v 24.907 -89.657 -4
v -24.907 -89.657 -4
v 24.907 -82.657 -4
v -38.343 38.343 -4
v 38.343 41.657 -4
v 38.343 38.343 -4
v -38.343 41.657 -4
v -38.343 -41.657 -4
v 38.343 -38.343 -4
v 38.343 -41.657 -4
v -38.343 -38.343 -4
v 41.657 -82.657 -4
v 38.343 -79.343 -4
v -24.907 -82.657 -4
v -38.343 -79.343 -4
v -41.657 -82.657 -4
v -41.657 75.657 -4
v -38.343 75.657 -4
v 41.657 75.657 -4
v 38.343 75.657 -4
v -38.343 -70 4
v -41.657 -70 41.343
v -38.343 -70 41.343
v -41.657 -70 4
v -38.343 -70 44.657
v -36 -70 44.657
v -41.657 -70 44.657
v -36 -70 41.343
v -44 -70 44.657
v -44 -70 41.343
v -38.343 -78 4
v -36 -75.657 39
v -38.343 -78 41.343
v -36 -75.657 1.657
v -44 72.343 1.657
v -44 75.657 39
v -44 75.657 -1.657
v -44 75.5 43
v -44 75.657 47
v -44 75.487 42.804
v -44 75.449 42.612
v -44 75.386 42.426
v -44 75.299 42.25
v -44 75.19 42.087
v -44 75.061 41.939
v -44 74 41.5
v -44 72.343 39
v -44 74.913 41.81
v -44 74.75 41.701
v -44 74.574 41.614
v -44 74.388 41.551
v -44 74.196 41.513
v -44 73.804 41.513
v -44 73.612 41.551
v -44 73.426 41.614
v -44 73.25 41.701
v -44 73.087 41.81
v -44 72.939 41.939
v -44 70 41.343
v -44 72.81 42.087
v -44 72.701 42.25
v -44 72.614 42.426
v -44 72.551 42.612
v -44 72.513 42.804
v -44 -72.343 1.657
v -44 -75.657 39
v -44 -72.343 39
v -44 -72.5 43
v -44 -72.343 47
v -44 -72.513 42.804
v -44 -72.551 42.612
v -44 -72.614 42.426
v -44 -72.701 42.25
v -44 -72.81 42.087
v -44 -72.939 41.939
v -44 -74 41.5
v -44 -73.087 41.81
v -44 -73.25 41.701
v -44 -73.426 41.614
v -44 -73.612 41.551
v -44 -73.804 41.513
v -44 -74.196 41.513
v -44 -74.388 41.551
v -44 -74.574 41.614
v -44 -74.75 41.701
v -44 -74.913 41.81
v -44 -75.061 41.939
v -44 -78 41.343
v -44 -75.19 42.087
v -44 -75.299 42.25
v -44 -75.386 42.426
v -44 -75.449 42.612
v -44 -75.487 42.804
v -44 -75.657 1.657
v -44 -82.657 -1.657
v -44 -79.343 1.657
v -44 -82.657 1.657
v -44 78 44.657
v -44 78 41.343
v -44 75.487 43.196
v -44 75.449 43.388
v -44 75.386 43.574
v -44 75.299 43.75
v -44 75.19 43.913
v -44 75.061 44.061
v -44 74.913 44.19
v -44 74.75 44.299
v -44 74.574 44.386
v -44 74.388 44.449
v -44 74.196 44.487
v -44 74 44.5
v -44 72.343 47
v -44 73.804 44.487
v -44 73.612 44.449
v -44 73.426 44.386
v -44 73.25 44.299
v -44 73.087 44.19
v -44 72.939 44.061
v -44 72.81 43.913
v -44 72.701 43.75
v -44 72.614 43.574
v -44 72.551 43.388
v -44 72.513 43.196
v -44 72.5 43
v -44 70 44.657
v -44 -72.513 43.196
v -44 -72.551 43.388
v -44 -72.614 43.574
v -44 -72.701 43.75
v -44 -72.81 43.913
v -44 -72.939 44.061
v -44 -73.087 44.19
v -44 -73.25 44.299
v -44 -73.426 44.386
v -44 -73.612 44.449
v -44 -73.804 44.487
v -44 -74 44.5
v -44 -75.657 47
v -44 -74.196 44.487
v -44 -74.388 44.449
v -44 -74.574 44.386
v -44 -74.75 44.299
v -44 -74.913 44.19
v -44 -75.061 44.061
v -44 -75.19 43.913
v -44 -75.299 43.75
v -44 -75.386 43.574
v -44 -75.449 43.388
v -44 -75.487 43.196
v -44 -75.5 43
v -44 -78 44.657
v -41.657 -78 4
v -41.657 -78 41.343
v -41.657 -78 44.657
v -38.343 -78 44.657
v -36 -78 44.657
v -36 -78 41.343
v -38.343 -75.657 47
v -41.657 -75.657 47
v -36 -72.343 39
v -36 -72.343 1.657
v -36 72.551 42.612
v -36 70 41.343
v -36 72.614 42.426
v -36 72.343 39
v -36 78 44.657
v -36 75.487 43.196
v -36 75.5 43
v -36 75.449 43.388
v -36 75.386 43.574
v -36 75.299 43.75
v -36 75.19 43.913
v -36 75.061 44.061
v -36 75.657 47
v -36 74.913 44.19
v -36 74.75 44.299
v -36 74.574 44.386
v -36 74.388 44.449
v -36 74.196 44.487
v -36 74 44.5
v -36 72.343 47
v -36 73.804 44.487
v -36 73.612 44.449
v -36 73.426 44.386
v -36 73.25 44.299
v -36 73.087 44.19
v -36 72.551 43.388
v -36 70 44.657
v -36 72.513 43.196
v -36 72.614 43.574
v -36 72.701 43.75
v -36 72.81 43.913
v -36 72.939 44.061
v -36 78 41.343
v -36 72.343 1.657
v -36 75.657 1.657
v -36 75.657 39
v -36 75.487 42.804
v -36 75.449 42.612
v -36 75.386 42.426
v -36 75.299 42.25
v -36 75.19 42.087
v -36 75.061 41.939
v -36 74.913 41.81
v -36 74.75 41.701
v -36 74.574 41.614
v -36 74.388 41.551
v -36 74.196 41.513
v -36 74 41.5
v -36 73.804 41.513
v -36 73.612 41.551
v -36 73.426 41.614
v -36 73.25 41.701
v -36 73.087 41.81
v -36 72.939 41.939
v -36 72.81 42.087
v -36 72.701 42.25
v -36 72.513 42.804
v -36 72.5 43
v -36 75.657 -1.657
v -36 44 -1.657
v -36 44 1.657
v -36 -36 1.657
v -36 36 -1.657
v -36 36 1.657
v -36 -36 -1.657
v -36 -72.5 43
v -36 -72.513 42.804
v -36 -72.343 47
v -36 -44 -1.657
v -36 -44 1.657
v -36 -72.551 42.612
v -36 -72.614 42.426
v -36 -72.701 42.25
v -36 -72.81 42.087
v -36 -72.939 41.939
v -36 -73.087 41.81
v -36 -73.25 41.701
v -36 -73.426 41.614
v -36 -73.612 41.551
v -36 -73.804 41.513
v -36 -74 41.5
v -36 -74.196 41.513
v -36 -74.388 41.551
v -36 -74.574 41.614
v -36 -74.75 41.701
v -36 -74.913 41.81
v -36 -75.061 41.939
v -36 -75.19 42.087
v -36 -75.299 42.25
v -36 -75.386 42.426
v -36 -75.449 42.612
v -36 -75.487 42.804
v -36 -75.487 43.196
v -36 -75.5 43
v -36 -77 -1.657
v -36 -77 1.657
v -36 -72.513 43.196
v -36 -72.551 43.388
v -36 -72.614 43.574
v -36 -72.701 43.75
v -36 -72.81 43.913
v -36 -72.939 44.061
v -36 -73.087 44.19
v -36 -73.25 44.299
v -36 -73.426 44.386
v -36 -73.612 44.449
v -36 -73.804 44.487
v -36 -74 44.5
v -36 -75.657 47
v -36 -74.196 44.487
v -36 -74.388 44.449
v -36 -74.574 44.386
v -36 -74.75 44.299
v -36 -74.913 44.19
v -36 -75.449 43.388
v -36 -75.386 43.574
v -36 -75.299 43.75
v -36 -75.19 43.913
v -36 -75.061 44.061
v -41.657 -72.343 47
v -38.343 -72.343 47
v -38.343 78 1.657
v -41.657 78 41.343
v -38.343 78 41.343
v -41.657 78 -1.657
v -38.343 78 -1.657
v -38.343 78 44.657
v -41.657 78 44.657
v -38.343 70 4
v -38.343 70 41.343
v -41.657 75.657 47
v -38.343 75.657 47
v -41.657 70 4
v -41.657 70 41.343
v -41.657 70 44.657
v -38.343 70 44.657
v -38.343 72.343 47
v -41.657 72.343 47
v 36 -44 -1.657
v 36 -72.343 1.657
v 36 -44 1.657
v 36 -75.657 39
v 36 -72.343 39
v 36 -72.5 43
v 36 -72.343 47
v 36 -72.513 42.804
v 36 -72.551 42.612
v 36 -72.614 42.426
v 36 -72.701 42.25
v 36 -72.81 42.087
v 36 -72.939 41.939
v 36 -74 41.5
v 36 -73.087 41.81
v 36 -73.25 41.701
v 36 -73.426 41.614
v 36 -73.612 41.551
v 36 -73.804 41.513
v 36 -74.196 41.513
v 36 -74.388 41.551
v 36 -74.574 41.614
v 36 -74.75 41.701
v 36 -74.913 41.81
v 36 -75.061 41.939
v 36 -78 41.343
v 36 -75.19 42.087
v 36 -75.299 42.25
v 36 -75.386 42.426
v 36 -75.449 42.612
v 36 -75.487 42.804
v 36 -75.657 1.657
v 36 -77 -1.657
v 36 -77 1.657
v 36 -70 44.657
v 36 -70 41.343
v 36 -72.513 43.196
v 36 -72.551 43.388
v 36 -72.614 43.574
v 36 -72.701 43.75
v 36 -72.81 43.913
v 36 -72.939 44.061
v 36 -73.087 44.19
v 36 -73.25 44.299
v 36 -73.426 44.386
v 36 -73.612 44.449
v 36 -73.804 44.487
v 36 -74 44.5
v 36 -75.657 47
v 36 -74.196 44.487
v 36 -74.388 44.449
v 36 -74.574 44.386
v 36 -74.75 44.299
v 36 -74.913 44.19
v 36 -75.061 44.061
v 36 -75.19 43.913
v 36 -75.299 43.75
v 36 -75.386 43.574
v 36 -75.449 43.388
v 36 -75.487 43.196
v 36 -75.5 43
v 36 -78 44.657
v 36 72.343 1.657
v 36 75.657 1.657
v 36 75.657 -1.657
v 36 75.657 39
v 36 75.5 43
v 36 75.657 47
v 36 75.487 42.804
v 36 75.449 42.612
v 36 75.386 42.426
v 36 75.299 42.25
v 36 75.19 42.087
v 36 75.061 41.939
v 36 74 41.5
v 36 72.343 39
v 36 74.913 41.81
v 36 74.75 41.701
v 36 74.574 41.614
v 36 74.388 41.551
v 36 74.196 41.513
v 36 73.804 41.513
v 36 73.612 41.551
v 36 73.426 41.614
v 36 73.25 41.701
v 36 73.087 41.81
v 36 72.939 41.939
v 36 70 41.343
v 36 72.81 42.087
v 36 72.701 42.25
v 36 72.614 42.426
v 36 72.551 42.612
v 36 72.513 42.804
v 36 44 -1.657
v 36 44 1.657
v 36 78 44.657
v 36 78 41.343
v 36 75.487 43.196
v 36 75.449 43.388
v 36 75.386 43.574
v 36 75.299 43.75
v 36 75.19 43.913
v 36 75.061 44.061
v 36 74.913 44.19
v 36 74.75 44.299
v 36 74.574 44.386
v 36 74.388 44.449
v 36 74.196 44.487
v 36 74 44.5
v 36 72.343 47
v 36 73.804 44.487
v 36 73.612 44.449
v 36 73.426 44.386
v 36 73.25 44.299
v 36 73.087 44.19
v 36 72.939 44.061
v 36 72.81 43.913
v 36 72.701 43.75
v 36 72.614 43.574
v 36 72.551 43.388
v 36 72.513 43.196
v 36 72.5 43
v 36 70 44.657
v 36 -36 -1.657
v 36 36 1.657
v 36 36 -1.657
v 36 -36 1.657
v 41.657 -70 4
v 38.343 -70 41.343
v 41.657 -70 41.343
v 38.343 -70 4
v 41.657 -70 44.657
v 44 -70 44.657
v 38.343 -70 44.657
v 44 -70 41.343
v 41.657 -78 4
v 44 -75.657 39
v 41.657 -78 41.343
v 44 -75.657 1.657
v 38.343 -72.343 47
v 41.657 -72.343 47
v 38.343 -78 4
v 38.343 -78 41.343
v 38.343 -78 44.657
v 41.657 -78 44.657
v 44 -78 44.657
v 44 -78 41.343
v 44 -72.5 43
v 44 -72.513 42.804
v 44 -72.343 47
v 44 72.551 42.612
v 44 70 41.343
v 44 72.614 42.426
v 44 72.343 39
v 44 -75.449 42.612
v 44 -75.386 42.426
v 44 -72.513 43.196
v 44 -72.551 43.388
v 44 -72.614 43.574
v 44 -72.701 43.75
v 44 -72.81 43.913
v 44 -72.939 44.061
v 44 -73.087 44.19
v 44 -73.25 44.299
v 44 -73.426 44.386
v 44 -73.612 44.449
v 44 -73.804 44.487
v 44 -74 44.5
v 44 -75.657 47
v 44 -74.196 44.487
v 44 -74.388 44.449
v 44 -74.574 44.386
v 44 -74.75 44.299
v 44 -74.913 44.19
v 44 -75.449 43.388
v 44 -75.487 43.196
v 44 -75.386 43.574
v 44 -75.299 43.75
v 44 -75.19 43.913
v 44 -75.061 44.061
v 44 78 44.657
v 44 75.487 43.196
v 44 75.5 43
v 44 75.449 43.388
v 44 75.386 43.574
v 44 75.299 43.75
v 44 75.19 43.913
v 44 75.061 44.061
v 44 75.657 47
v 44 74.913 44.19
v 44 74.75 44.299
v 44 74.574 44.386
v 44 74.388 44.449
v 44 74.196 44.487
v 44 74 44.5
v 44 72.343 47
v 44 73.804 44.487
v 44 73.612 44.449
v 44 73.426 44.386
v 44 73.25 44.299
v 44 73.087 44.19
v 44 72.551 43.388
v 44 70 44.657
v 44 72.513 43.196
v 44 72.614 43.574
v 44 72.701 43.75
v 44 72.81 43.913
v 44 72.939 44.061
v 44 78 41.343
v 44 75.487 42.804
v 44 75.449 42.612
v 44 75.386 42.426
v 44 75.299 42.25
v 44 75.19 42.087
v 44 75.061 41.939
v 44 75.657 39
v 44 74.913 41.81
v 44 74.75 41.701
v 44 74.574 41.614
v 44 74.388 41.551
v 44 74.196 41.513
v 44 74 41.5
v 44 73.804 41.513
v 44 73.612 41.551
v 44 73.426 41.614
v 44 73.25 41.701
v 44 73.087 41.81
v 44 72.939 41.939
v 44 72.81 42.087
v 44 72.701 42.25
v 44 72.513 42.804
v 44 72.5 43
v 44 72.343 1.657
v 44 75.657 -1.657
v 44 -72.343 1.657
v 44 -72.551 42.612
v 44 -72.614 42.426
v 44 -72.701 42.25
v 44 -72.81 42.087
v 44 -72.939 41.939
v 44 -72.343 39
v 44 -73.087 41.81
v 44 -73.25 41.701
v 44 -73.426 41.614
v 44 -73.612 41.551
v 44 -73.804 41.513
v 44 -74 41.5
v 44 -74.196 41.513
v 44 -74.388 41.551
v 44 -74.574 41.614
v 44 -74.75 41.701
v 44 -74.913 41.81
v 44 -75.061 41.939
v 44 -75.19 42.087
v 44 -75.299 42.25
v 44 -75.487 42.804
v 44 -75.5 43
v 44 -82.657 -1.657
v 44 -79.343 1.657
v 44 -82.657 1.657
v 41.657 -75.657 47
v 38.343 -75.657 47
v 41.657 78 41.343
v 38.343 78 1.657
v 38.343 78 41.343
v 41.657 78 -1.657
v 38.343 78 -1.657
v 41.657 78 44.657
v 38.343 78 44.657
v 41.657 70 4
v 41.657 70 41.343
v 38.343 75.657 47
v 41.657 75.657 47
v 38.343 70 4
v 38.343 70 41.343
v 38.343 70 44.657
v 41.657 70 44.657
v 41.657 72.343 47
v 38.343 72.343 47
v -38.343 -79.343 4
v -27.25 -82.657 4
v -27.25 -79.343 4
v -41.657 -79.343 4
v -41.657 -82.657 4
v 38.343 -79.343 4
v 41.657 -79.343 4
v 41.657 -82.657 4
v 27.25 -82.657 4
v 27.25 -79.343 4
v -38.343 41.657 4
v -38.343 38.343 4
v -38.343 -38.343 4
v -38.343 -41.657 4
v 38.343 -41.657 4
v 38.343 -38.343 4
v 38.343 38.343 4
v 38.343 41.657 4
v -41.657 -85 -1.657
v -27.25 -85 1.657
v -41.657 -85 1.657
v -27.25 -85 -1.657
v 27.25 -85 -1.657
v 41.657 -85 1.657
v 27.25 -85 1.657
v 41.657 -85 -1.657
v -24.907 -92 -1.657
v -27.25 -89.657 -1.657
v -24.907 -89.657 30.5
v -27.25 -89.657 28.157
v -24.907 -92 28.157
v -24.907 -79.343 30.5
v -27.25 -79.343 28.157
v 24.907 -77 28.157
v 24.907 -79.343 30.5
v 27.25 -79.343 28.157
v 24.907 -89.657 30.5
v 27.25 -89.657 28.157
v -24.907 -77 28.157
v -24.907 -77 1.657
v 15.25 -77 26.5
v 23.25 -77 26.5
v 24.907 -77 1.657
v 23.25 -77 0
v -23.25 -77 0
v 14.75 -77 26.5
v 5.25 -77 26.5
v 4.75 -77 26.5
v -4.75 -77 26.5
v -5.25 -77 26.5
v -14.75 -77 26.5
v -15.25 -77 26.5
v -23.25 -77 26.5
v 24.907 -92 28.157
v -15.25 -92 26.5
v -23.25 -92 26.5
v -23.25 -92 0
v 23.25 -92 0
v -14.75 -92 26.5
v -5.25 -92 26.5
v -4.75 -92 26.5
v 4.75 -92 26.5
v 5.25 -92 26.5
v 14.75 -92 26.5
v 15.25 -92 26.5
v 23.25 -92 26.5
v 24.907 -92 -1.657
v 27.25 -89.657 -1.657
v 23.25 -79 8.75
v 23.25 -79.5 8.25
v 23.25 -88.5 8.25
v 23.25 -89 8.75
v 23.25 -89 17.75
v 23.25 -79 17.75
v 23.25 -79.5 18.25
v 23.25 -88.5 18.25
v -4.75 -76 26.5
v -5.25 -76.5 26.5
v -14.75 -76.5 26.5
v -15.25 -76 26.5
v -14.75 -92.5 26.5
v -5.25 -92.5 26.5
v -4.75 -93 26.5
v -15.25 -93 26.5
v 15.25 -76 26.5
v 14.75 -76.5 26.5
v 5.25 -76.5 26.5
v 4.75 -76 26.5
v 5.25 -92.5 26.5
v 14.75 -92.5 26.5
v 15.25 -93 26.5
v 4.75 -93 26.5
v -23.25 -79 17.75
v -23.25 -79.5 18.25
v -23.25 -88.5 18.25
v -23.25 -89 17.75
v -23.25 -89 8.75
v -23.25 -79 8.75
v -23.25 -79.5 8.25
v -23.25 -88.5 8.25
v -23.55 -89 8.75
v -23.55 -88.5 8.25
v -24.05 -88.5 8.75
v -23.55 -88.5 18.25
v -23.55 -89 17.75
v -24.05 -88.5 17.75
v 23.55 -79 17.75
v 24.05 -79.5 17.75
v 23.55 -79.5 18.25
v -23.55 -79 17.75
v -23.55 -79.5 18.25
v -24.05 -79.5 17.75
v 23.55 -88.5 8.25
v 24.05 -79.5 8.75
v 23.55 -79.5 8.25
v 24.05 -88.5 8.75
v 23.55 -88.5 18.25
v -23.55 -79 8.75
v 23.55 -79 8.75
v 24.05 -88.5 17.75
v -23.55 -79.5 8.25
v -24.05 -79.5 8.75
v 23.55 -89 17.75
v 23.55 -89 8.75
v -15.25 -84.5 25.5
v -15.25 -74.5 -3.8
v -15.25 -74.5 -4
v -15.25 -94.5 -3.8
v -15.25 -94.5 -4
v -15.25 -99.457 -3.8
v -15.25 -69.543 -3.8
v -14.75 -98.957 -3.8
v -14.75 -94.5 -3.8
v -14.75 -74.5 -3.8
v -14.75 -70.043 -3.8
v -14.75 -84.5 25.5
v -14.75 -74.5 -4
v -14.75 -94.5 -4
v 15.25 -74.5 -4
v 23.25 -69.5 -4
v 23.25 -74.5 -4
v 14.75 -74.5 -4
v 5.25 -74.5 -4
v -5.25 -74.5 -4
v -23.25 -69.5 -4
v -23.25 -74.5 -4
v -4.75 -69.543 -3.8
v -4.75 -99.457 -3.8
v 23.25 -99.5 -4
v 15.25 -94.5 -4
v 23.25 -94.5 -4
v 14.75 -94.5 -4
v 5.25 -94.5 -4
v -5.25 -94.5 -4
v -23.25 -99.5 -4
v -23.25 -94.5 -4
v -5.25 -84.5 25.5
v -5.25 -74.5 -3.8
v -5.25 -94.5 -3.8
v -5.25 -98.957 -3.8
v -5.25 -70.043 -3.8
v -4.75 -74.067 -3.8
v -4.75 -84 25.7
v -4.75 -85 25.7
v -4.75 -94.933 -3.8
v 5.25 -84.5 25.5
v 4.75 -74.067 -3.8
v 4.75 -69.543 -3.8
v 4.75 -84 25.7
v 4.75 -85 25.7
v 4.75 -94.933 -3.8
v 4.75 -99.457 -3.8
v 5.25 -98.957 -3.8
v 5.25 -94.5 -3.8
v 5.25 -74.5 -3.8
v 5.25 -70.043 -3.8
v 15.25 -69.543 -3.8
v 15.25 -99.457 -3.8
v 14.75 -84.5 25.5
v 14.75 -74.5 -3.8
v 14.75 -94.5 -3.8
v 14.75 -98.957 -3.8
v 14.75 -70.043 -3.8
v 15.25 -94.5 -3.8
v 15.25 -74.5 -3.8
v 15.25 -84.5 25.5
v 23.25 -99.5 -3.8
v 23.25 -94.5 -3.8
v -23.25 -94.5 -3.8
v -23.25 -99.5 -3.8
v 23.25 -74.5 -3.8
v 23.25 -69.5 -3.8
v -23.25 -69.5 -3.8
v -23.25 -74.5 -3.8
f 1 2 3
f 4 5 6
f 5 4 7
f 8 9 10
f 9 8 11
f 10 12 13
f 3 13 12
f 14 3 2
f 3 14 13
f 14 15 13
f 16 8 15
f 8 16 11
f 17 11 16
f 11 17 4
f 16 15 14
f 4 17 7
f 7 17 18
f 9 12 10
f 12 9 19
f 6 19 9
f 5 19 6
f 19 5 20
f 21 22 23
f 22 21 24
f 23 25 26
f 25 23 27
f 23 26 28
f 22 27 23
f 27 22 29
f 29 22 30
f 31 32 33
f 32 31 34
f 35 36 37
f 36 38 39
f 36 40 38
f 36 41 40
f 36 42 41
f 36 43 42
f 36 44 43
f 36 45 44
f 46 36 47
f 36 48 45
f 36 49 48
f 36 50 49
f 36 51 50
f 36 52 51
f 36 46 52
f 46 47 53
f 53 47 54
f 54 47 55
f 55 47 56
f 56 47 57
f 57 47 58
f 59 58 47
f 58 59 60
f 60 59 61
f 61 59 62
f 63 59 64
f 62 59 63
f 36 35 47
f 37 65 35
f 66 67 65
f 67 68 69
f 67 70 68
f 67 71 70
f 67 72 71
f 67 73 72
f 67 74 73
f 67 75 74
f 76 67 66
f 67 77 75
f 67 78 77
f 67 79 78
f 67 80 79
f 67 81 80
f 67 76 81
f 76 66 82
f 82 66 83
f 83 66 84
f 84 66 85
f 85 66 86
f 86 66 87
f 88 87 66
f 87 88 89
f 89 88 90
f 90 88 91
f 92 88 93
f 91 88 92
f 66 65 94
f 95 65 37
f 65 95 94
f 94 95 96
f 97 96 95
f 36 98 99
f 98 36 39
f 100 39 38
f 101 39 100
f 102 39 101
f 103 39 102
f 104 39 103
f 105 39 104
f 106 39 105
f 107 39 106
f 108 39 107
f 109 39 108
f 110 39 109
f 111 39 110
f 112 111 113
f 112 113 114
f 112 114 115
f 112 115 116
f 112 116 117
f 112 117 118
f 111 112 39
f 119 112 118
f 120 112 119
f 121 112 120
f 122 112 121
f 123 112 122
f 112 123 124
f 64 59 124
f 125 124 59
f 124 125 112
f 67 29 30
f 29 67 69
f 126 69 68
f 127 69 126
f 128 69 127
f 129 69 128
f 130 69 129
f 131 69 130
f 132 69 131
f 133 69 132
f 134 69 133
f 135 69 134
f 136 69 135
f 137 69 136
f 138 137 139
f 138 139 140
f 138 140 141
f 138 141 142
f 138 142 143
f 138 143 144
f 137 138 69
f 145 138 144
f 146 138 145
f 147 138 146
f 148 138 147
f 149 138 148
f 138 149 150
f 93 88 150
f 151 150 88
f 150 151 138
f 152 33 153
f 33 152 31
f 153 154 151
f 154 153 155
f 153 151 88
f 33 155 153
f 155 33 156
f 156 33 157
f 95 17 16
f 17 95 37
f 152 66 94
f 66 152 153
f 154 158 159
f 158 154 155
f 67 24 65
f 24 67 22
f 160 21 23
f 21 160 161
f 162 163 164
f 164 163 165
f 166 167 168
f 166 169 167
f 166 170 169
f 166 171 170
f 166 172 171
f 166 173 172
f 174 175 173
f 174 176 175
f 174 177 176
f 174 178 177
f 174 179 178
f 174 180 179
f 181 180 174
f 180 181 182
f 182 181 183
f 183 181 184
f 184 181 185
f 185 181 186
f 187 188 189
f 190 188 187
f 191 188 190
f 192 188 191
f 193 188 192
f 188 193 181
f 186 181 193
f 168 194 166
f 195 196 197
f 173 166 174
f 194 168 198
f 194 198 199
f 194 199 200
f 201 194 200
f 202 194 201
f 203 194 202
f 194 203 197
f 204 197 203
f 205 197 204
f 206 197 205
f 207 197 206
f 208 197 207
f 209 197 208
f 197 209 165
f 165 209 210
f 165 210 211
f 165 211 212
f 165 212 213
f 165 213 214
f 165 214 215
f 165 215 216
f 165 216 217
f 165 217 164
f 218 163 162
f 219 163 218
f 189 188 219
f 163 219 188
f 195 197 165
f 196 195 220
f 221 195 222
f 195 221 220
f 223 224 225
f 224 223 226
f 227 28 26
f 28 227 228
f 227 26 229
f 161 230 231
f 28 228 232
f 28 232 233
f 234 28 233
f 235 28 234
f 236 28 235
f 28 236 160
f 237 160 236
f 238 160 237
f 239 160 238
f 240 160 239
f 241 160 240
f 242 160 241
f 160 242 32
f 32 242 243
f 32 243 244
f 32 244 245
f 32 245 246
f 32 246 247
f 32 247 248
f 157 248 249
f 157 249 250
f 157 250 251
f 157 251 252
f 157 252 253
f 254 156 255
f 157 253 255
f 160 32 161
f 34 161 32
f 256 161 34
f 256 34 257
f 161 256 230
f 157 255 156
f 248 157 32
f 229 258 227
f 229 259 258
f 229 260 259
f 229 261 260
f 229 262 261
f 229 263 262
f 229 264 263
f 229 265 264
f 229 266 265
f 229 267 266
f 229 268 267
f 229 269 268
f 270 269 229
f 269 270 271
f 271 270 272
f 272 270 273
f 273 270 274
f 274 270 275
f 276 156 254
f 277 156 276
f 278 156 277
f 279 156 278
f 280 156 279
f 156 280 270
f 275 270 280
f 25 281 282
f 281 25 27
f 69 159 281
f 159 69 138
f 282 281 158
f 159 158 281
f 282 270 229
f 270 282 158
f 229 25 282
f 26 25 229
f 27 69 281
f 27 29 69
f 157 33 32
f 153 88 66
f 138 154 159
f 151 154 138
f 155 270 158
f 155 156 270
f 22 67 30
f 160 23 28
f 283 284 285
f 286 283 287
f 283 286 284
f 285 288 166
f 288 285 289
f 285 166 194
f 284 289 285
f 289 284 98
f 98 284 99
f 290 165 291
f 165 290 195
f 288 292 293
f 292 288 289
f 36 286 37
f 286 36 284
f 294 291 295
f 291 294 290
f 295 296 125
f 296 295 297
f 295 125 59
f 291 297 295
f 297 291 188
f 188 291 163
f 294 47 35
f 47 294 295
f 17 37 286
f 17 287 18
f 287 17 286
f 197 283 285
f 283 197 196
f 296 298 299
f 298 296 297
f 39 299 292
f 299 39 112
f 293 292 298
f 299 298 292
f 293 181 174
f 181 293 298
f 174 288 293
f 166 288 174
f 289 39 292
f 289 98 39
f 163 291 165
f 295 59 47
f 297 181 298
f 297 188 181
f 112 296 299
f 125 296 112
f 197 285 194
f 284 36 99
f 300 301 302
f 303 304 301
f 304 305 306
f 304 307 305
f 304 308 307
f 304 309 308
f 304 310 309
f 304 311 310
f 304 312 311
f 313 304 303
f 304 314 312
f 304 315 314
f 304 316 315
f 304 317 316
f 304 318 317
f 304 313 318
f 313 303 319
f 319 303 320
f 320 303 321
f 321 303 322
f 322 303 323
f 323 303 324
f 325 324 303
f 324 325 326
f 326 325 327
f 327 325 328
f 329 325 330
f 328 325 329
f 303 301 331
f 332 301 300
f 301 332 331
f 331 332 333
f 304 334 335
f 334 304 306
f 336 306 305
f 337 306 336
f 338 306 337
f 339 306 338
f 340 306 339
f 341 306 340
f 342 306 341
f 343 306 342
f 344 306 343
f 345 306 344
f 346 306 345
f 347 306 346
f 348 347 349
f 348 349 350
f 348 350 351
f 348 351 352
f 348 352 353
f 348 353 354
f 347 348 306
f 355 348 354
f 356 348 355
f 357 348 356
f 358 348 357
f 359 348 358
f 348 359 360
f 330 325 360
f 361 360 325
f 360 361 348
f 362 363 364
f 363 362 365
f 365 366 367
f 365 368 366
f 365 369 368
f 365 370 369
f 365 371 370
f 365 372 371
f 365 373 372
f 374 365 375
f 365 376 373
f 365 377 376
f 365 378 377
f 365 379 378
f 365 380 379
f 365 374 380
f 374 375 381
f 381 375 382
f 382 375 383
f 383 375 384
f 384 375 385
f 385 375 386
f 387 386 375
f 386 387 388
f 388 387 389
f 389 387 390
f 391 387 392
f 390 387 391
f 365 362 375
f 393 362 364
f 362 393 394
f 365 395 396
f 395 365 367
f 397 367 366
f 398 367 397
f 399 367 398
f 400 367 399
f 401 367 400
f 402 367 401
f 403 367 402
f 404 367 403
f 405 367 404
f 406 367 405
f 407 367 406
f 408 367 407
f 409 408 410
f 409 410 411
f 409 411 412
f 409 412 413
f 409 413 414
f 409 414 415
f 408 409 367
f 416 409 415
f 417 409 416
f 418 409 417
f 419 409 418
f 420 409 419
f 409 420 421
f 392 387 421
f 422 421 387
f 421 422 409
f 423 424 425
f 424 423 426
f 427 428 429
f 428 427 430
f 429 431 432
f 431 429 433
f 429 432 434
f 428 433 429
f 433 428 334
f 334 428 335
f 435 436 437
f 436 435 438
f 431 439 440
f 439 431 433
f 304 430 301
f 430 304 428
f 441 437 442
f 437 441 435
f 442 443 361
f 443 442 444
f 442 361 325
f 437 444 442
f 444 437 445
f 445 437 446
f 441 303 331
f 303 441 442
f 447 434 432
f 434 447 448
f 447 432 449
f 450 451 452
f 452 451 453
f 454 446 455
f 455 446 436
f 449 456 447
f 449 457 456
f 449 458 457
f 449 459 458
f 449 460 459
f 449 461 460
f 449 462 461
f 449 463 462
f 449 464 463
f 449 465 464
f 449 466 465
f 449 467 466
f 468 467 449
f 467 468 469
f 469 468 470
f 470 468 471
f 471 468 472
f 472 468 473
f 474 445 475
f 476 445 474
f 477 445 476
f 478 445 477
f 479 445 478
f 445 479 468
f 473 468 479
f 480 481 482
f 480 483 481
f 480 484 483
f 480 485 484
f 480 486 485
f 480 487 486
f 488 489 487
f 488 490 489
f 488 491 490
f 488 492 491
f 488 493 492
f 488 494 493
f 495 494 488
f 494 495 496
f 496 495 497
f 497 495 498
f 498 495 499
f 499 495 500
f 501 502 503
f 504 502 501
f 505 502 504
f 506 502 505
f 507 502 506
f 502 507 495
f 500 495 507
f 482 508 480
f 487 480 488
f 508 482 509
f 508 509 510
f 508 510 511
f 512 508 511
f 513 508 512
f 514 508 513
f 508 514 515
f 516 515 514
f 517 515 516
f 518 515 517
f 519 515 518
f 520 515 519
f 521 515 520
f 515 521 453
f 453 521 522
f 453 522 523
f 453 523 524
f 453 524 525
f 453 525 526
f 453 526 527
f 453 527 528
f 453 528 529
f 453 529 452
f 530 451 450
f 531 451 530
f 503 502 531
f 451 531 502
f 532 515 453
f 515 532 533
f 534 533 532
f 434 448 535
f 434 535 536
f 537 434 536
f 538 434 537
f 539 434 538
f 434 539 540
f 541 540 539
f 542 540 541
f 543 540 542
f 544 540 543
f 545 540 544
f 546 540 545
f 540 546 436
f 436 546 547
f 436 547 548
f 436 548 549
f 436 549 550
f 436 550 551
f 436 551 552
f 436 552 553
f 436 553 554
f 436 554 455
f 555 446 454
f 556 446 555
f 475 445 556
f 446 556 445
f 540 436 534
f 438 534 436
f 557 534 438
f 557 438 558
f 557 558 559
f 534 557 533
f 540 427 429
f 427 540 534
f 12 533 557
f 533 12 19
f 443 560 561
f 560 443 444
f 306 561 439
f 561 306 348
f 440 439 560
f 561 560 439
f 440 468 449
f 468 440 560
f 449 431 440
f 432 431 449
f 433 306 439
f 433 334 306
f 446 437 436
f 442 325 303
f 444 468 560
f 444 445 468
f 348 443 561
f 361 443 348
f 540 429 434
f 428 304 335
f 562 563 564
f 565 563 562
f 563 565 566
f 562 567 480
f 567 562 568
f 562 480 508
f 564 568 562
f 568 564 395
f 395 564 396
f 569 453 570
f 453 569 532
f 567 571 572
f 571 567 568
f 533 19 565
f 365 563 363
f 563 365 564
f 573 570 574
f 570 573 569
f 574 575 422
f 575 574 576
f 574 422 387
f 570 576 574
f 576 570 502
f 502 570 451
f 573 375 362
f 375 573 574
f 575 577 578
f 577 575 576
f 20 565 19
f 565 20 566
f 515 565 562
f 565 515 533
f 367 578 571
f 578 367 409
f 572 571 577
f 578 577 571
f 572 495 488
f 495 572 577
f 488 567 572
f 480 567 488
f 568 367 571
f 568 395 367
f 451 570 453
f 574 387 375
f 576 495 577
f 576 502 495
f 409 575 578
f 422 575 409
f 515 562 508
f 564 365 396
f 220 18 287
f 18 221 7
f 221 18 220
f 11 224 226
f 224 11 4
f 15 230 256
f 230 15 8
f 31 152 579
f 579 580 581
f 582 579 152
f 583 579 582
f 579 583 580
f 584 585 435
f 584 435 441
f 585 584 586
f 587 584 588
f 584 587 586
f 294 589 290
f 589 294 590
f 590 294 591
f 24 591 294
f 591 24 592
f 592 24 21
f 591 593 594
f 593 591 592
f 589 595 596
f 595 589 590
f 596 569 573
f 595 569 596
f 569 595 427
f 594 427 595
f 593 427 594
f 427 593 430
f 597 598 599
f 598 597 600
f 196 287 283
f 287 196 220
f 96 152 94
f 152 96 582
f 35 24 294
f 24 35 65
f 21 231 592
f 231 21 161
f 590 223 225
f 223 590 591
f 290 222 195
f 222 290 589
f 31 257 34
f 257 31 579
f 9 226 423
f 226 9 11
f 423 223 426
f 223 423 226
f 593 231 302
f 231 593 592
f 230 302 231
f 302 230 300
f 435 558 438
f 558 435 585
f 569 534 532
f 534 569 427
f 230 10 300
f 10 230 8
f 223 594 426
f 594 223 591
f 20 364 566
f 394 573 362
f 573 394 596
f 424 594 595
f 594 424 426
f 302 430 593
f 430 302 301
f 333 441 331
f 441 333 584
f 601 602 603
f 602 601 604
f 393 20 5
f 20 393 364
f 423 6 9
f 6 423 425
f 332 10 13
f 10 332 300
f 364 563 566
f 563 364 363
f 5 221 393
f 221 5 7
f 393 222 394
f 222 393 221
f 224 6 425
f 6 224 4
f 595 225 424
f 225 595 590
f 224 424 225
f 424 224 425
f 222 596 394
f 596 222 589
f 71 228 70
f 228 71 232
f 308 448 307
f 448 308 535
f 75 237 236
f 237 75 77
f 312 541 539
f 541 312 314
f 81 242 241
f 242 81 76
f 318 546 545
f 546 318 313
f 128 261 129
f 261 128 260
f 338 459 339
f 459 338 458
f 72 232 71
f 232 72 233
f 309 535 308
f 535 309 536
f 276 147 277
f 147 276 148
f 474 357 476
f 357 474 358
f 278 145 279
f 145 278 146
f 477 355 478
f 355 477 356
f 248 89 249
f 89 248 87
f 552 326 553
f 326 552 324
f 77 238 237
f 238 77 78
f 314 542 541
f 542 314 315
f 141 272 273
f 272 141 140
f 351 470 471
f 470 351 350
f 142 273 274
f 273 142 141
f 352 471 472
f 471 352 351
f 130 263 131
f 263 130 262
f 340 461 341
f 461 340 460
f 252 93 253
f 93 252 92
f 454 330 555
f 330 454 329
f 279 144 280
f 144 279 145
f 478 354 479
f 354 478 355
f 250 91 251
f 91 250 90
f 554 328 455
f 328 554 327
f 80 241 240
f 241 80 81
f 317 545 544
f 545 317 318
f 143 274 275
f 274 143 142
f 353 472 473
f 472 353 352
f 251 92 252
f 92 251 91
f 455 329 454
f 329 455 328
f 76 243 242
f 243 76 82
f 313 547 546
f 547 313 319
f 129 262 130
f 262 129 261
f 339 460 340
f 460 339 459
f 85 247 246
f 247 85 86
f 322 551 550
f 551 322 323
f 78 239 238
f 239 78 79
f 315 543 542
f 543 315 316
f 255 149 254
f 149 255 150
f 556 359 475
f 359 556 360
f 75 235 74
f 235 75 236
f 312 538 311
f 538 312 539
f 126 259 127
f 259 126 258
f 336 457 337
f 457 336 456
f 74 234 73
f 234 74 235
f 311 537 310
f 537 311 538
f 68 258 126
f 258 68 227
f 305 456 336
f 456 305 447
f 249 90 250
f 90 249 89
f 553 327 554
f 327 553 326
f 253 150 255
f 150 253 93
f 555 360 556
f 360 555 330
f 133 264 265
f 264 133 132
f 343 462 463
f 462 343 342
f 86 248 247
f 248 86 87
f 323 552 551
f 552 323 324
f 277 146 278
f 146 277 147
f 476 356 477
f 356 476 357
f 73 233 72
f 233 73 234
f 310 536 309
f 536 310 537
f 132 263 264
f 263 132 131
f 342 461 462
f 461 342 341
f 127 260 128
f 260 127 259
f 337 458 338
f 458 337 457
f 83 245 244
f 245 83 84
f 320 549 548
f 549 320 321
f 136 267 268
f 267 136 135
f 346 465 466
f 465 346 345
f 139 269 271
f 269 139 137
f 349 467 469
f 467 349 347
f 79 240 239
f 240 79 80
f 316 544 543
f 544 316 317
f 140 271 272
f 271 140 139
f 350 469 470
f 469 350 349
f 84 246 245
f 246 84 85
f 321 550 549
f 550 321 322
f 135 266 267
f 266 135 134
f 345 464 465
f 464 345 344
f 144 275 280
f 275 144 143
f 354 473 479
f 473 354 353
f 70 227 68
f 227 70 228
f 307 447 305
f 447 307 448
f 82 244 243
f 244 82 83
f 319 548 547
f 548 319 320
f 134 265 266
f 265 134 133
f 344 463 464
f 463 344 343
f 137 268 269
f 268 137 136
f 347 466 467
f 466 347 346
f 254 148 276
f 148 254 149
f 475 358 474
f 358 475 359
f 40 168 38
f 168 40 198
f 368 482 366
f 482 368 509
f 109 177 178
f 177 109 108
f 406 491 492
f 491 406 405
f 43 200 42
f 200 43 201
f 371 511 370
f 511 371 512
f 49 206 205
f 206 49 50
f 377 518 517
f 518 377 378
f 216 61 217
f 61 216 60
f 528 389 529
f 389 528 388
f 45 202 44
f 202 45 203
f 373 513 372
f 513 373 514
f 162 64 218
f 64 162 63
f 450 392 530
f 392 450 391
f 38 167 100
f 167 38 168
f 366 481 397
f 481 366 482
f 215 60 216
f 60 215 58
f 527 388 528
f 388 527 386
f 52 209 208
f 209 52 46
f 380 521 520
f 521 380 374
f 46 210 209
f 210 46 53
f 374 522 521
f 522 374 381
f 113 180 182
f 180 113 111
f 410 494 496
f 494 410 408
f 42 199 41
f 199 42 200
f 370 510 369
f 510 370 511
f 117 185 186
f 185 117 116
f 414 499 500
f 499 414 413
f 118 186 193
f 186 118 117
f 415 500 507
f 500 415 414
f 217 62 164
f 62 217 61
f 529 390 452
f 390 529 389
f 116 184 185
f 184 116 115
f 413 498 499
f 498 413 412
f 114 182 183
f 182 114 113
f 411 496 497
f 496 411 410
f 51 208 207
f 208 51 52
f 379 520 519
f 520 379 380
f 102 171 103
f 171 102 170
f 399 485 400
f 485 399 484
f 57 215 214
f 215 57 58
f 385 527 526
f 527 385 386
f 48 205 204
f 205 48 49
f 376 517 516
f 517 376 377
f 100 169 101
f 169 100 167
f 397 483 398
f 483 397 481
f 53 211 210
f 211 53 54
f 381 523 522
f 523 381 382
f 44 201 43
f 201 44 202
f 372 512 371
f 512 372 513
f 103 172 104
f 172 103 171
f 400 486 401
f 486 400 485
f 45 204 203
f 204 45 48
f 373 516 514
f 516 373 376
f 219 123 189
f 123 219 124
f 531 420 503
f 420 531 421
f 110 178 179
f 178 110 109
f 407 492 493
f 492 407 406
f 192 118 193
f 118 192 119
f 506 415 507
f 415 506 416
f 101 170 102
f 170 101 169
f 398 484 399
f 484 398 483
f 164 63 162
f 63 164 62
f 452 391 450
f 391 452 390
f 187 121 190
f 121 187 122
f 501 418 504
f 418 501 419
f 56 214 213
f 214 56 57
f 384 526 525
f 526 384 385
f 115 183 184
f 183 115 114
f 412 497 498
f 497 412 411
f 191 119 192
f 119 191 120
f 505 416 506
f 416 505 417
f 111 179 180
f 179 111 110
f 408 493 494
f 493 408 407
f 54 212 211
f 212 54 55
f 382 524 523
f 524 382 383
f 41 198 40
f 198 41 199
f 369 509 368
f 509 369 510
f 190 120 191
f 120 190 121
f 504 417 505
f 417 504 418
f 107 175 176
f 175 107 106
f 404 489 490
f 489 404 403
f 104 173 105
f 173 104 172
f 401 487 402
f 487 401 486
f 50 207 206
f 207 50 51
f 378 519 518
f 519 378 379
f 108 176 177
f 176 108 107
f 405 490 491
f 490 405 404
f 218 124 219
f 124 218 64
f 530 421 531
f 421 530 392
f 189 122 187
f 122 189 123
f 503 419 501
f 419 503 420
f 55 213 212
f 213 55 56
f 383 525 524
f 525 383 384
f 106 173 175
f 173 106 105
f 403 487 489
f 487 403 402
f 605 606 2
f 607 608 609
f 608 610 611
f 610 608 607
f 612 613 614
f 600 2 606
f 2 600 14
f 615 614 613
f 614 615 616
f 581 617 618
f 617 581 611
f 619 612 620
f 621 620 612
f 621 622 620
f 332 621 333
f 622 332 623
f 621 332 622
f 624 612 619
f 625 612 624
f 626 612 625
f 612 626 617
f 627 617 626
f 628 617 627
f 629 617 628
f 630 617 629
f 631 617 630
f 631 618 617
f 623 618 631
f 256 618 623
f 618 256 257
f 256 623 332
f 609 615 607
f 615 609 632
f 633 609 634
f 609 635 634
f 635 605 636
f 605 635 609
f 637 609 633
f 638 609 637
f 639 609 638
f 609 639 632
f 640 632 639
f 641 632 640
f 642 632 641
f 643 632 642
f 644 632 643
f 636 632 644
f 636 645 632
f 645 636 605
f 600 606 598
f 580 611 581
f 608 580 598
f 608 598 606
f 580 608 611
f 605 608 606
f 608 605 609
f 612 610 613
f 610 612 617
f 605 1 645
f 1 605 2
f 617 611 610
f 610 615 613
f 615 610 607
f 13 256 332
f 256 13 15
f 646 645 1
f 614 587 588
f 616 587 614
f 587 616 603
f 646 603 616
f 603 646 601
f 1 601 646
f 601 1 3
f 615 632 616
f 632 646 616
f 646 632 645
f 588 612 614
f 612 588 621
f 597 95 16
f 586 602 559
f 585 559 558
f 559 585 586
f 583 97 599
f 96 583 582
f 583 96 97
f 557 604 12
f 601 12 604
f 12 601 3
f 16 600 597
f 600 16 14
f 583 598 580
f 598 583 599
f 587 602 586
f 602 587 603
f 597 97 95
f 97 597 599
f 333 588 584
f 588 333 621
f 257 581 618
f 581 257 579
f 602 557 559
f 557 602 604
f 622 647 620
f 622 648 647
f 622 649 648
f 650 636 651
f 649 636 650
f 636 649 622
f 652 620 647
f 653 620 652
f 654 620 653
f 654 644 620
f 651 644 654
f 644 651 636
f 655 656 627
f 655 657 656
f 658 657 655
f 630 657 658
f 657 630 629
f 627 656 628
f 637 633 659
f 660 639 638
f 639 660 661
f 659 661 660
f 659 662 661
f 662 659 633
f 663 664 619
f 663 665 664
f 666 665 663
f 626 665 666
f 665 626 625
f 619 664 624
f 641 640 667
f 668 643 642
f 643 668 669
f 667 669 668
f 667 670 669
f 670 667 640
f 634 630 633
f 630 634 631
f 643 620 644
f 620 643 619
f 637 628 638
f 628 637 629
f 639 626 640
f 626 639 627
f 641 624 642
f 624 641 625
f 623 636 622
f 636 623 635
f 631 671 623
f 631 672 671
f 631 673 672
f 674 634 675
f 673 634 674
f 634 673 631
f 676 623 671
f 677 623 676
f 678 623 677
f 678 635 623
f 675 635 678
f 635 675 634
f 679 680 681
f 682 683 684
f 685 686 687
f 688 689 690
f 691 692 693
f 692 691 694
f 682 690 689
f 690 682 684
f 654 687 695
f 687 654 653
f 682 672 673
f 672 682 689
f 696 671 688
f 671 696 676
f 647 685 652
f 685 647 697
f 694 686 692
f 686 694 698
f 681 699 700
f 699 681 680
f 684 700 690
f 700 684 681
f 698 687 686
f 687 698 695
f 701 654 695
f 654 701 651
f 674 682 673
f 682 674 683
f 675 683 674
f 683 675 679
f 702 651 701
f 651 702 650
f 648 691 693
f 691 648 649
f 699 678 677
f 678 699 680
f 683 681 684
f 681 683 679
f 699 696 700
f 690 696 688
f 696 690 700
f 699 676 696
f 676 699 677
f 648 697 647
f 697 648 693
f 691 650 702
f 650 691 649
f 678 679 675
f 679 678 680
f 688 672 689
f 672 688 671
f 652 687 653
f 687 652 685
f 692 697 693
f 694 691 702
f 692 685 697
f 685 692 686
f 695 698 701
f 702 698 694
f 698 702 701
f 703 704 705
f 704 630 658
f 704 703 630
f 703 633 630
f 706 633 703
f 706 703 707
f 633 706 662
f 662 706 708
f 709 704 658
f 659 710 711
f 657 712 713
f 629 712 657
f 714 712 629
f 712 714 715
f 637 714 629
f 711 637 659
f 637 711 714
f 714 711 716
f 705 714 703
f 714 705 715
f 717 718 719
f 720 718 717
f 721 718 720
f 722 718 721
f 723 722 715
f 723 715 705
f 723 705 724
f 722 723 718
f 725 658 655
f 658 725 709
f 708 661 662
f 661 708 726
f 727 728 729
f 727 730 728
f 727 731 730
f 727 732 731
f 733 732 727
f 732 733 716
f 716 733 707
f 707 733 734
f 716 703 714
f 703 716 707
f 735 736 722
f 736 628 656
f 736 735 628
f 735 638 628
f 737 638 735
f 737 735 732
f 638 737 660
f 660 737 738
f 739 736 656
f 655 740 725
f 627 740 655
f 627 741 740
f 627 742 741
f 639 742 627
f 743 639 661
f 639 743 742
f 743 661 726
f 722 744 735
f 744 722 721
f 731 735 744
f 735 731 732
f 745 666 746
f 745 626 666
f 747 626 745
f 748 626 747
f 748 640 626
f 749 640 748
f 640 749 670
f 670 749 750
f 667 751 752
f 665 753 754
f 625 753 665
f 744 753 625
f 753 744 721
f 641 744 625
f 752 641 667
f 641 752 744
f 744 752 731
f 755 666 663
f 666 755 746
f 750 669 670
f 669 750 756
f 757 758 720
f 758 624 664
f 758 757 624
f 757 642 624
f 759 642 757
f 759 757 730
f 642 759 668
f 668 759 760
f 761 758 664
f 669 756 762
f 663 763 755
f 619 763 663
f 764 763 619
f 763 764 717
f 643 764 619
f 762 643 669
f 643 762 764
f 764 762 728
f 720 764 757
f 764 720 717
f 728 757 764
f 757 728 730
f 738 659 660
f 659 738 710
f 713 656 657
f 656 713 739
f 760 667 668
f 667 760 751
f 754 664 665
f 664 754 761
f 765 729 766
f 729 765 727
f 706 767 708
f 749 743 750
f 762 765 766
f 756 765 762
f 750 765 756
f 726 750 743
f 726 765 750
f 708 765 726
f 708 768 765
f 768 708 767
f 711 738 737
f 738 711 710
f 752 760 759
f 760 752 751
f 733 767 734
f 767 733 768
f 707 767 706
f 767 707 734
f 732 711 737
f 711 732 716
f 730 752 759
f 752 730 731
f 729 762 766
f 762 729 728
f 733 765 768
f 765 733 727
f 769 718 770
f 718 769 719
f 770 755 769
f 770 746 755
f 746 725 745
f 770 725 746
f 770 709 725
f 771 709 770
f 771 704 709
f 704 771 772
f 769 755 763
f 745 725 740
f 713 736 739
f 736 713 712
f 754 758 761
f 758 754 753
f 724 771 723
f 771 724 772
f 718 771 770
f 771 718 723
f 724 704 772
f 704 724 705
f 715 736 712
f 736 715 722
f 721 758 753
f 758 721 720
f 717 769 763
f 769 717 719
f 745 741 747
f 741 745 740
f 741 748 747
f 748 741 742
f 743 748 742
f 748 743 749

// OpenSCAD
// file: utils.scad
// utility library
// Copyright (C) 2022  Robert Schiele <rschiele@gmail.com>
//
// This work is licensed under the Creative Commons Attribution 4.0
// International License. To view a copy of this license, visit 
// http://creativecommons.org/licenses/by/4.0/.

fmod = function(a, b) (a%b + b)%b;
eps = 0.01;

module hexcut(gh, gt, hex, ch) {
    r=hex.x/3-gt/2*sqrt(3);
    chr=r+ch*sqrt(3)+eps;
    translate([0, 0, -eps])
        cylinder(ch+eps, chr, r, $fn=6);
    translate([0, 0, -eps])
        cylinder(gh+2*eps, r=r, $fn=6);
    translate([0, 0, gh-ch])
        cylinder(ch+eps, r, chr, $fn=6);
}

module singlehex(gh, gt, hex, ch) {
        hexcut(gh, gt, hex,ch);
        translate([hex.x/2, hex.y/2, 0])
            hexcut(gh, gt, hex,ch);
}

module hexgrid(size=1, center=false, hexsize=15,
            width=1.4, offset=[0,0], chamfer=0) {
    s = is_list(size) ? size : [size,size,1];
    assert(width < hexsize, "width should be smaller than hexsize");
    assert(chamfer*2 <= width, "chamfer should not exceed half of width");
    assert(chamfer*2 <= s.z, "chamfer should not exceed half of size.z");
    hex = [hexsize*sqrt(3), hexsize];
    r = center ? s/2 : s;
    ro = [fmod(offset.x, hex.x), fmod(offset.y, hex.y)];
    difference() {
        cube(s, center);
        translate([0, 0, center ? -s.z/2 : 0])
        for(x=[0:hex.x:r.x+hex.x+ro.x])
        for(y=[0:hex.y:r.y+hex.y+ro.y]) {
            translate([x-ro.x, y-ro.y, 0])
                singlehex(s.z, width, hex, chamfer);
            if(center) {
                translate([-hex.x-x-ro.x,        y-ro.y, 0])
                    singlehex(s.z, width, hex, chamfer);
                translate([       x-ro.x, -hex.y-y-ro.y, 0])
                    singlehex(s.z, width, hex, chamfer);
                translate([-hex.x-x-ro.x, -hex.y-y-ro.y, 0])
                    singlehex(s.z, width, hex, chamfer);
            }
        }
    }
}

module cubecut(gh, gt, cube, ch) {
    r=cube/2-gt/2*sqrt(2);
    chr=r+ch*sqrt(2)+eps;
    translate([0, 0, -eps])
        cylinder(ch+eps, chr, r, $fn=4);
    translate([0, 0, -eps])
        cylinder(gh+2*eps, r=r, $fn=4);
    translate([0, 0, gh-ch])
        cylinder(ch+eps, r, chr, $fn=4);
}

module singlecube(gh, gt, cube, ch) {
        cubecut(gh, gt, cube,ch);
        translate([cube/2, cube/2, 0])
            cubecut(gh, gt, cube, ch);
}

module cubicgrid(size=1, center=false, cubesize=15,
            width=1.4, offset=[0,0], chamfer=0) {
    s = is_list(size) ? size : [size,size,1];
    assert(width < cubesize, "width should be smaller than cubesize");
    assert(chamfer*2 <= width, "chamfer should not exceed half of width");
    assert(chamfer*2 <= s.z, "chamfer should not exceed half of size.z");
    cube = cubesize*sqrt(2);
    r = center ? s/2 : s;
    ro = [fmod(offset.x, cube), fmod(offset.y, cube)];
    difference() {
        cube(s, center);
        translate([0, 0, center ? -s.z/2 : 0])
        for(x=[0:cube:r.x+cube+ro.x])
        for(y=[0:cube:r.y+cube+ro.y]) {
            translate([x-ro.x, y-ro.y, 0])
                singlecube(s.z, width, cube, chamfer);
            if(center) {
                translate([-cube-x-ro.x,        y-ro.y, 0])
                    singlecube(s.z, width, cube, chamfer);
                translate([       x-ro.x, -cube.y-y-ro.y, 0])
                    singlecube(s.z, width, cube, chamfer);
                translate([-cube.x-x-ro.x, -cube.y-y-ro.y, 0])
                    singlecube(s.z, width, cube, chamfer);
            }
        }
    }
}

module chamferedcube(size=1, center=false, chamfer=0) {
    s = is_list(size) ? size : [size,size,size];
    c = center ? s/2 : [0, 0, 0];
    ch = chamfer;
    translate(-c)
    polyhedron([
        [     0,     ch,     ch],
        [    ch,      0,     ch],
        [    ch,     ch,      0],
        [s.x   ,     ch,     ch],
        [s.x-ch,      0,     ch],
        [s.x-ch,     ch,      0],
        [     0, s.y-ch,     ch],
        [    ch, s.y   ,     ch],
        [    ch, s.y-ch,      0],
        [s.x   , s.y-ch,     ch],
        [s.x-ch, s.y   ,     ch],
        [s.x-ch, s.y-ch,      0],
        [     0,     ch, s.z-ch],
        [    ch,      0, s.z-ch],
        [    ch,     ch, s.z   ],
        [s.x   ,     ch, s.z-ch],
        [s.x-ch,      0, s.z-ch],
        [s.x-ch,     ch, s.z   ],
        [     0, s.y-ch, s.z-ch],
        [    ch, s.y   , s.z-ch],
        [    ch, s.y-ch, s.z   ],
        [s.x   , s.y-ch, s.z-ch],
        [s.x-ch, s.y   , s.z-ch],
        [s.x-ch, s.y-ch, s.z   ],
    ], [
        [ 0, 1, 2],
        [ 3, 5, 4],
        [ 6, 8, 7],
        [ 9,10,11],
        [12,14,13],
        [15,16,17],
        [18,19,20],
        [21,23,22],
    
        [ 1, 4, 5, 2],
        [ 0, 2, 8, 6],
        [ 9,11, 5, 3],
        [10, 7, 8,11],
        [ 0,12,13, 1],
        [ 3, 4,16,15],
        [ 6, 7,19,18],
        [ 9,21,22,10],
        [13,14,17,16],
        [12,18,20,14],
        [21,15,17,23],
        [22,23,20,19],

        [ 2, 5,11, 8],
        [ 1,13,16, 4],
        [ 0, 6,18,12],
        [ 3,15,21, 9],
        [ 7,10,22,19],
        [14,20,23,17],
    ]);
};

module chamferedcylinder(h, r, chamfer=0) {
    ch = (chamfer < 0) ? -chamfer : chamfer;
        cylinder(ch, r-chamfer, r);
    translate([0, 0, ((chamfer<0)?0:ch)])
        cylinder(h-((chamfer<0)?0:(2*ch)), r=r);
    translate([0, 0, h-ch])
        cylinder(ch, r, r-chamfer);
}
// main file
use <utils.scad>

box=88;
sil=140;
height=35;
th=8;
ch=th/(2+sqrt(2));
hyg=true;
support=true;
eps=1/128;
$fa=1;
$fs=0.2;

difference() {
    for(i=[-1,1]) {
        translate([i*(box/2-th/2),
                   -(hyg?hygoff-hygdep+th:0)/2, 0])
            chamferedcube([
                th,
                2*th + sil + (hyg?hygoff-hygdep+th:0),
                th], center=true, chamfer=ch);
        translate([0, i*(box/2-th/2), 0])
            chamferedcube([box, th, th], center=true,
                          chamfer=ch);
        for(j=[-1,1])
            translate([i*(box/2-th/2),
                       j*(sil/2+th/2), 0]) {
                translate([0, 0, (height+th)/2])
                    chamferedcube([th, th, 2*th+height],
                                  center=true,
                                  chamfer=ch);
                translate([0, 0, height+th])
                    rotate([90,0,90])
                        linear_extrude(th,center=true)
                            polygon([
                                [-th/2,th/2-ch],
                                [ch-th/2,th/2],
                                [th/2-ch,th/2],
                                [th/2,th/2-ch],
                                [th/2,ch-th/2],
                                [th/2-ch,-th/2],
                                [ch-th/2,-th/2],
                                [-th/2,ch-th/2],
                            ]);
            }
    }
    for(i=[-1,1])
        translate([0, i*(sil/2+th/2), height+th])
            rotate([0,90,0])
                cylinder(box+th, d=3, center=true);
}

hygoff = 14;
hygwdt = 46.5;
hyghgt = 26.5;
hygdep = 15;
hygind = 0.8;
hygindwdt = 10;
hygindhgt = 10;
hygindoff = 0.5;
hygth = 4;

if(hyg)
    translate([0,
               -hygoff+hygdep/2-th-sil/2,
               -th/2+hyghgt/2+hygth]) {
        difference() {
            union() {
                chamferedcube([hygwdt+2*hygth,
                               hygdep,
                               hyghgt+2*hygth],
                              center=true, chamfer=ch);
                translate([0,
                           hygoff-hygdep/2+th+sil/2
                               -(sil/2+th/2)
                               -(hygoff-hygdep+th),
                           th/2-hyghgt/2-hygth])
                    chamferedcube([box, th, th],
                                  center=true,
                                  chamfer=ch);
            }
            cube([hygwdt, hygdep+2*eps, hyghgt],
                 center=true);
            translate([0,hygindoff,0])
                chamferedcube([hygwdt+2*hygind,
                               hygindwdt,
                               hygindhgt],
                              center=true, chamfer=0.5);
        }

        if(support) color("black", 0.1){
        for(i=[-15:10:15])
        translate([i,0,0])
        rotate([90,0,90])
            linear_extrude(0.5, center = true)
                polygon([
                    [-hygdep/2-1, hyghgt/2],
                    [-15, -hyghgt/2-hygth],
                    [-10, -hyghgt/2-hygth],
                    [0, hyghgt/2-1],
                    [10, -hyghgt/2-hygth],
                    [15, -hyghgt/2-hygth],
                    [hygdep/2+1, hyghgt/2],
                ]);
        for(i=[-10,10])
        translate([i,0,0])
        rotate([90,0,90])
            linear_extrude(10.5, center = true) {
                polygon([
                    [-hygdep/2-0.5, hyghgt/2],
                    [-hygdep/2-1, hyghgt/2],
                    [-15, -hyghgt/2-hygth],
                    [-14.5, -hyghgt/2-hygth],
                ]);
                polygon([
                    [14.5, -hyghgt/2-hygth],
                    [15, -hyghgt/2-hygth],
                    [hygdep/2+1, hyghgt/2],
                    [hygdep/2+0.5, hyghgt/2],
                ]);
            }
        rotate([90,0,90])
            linear_extrude(10.5, center = true)
                polygon([
                    [-0.5, hyghgt/2-0.8],
                    [-10.5, -hyghgt/2-hygth],
                    [-10, -hyghgt/2-hygth],
                    [0, hyghgt/2-1],
                    [10, -hyghgt/2-hygth],
                    [10.5, -hyghgt/2-hygth],
                    [0.5, hyghgt/2-0.8],
                ]);
        for(i=[-1,1]){
        translate([0,i*12.5,0.1-hyghgt/2-hygth])
        cube([hygwdt,5,0.2], center=true);
        }
        }
    }
